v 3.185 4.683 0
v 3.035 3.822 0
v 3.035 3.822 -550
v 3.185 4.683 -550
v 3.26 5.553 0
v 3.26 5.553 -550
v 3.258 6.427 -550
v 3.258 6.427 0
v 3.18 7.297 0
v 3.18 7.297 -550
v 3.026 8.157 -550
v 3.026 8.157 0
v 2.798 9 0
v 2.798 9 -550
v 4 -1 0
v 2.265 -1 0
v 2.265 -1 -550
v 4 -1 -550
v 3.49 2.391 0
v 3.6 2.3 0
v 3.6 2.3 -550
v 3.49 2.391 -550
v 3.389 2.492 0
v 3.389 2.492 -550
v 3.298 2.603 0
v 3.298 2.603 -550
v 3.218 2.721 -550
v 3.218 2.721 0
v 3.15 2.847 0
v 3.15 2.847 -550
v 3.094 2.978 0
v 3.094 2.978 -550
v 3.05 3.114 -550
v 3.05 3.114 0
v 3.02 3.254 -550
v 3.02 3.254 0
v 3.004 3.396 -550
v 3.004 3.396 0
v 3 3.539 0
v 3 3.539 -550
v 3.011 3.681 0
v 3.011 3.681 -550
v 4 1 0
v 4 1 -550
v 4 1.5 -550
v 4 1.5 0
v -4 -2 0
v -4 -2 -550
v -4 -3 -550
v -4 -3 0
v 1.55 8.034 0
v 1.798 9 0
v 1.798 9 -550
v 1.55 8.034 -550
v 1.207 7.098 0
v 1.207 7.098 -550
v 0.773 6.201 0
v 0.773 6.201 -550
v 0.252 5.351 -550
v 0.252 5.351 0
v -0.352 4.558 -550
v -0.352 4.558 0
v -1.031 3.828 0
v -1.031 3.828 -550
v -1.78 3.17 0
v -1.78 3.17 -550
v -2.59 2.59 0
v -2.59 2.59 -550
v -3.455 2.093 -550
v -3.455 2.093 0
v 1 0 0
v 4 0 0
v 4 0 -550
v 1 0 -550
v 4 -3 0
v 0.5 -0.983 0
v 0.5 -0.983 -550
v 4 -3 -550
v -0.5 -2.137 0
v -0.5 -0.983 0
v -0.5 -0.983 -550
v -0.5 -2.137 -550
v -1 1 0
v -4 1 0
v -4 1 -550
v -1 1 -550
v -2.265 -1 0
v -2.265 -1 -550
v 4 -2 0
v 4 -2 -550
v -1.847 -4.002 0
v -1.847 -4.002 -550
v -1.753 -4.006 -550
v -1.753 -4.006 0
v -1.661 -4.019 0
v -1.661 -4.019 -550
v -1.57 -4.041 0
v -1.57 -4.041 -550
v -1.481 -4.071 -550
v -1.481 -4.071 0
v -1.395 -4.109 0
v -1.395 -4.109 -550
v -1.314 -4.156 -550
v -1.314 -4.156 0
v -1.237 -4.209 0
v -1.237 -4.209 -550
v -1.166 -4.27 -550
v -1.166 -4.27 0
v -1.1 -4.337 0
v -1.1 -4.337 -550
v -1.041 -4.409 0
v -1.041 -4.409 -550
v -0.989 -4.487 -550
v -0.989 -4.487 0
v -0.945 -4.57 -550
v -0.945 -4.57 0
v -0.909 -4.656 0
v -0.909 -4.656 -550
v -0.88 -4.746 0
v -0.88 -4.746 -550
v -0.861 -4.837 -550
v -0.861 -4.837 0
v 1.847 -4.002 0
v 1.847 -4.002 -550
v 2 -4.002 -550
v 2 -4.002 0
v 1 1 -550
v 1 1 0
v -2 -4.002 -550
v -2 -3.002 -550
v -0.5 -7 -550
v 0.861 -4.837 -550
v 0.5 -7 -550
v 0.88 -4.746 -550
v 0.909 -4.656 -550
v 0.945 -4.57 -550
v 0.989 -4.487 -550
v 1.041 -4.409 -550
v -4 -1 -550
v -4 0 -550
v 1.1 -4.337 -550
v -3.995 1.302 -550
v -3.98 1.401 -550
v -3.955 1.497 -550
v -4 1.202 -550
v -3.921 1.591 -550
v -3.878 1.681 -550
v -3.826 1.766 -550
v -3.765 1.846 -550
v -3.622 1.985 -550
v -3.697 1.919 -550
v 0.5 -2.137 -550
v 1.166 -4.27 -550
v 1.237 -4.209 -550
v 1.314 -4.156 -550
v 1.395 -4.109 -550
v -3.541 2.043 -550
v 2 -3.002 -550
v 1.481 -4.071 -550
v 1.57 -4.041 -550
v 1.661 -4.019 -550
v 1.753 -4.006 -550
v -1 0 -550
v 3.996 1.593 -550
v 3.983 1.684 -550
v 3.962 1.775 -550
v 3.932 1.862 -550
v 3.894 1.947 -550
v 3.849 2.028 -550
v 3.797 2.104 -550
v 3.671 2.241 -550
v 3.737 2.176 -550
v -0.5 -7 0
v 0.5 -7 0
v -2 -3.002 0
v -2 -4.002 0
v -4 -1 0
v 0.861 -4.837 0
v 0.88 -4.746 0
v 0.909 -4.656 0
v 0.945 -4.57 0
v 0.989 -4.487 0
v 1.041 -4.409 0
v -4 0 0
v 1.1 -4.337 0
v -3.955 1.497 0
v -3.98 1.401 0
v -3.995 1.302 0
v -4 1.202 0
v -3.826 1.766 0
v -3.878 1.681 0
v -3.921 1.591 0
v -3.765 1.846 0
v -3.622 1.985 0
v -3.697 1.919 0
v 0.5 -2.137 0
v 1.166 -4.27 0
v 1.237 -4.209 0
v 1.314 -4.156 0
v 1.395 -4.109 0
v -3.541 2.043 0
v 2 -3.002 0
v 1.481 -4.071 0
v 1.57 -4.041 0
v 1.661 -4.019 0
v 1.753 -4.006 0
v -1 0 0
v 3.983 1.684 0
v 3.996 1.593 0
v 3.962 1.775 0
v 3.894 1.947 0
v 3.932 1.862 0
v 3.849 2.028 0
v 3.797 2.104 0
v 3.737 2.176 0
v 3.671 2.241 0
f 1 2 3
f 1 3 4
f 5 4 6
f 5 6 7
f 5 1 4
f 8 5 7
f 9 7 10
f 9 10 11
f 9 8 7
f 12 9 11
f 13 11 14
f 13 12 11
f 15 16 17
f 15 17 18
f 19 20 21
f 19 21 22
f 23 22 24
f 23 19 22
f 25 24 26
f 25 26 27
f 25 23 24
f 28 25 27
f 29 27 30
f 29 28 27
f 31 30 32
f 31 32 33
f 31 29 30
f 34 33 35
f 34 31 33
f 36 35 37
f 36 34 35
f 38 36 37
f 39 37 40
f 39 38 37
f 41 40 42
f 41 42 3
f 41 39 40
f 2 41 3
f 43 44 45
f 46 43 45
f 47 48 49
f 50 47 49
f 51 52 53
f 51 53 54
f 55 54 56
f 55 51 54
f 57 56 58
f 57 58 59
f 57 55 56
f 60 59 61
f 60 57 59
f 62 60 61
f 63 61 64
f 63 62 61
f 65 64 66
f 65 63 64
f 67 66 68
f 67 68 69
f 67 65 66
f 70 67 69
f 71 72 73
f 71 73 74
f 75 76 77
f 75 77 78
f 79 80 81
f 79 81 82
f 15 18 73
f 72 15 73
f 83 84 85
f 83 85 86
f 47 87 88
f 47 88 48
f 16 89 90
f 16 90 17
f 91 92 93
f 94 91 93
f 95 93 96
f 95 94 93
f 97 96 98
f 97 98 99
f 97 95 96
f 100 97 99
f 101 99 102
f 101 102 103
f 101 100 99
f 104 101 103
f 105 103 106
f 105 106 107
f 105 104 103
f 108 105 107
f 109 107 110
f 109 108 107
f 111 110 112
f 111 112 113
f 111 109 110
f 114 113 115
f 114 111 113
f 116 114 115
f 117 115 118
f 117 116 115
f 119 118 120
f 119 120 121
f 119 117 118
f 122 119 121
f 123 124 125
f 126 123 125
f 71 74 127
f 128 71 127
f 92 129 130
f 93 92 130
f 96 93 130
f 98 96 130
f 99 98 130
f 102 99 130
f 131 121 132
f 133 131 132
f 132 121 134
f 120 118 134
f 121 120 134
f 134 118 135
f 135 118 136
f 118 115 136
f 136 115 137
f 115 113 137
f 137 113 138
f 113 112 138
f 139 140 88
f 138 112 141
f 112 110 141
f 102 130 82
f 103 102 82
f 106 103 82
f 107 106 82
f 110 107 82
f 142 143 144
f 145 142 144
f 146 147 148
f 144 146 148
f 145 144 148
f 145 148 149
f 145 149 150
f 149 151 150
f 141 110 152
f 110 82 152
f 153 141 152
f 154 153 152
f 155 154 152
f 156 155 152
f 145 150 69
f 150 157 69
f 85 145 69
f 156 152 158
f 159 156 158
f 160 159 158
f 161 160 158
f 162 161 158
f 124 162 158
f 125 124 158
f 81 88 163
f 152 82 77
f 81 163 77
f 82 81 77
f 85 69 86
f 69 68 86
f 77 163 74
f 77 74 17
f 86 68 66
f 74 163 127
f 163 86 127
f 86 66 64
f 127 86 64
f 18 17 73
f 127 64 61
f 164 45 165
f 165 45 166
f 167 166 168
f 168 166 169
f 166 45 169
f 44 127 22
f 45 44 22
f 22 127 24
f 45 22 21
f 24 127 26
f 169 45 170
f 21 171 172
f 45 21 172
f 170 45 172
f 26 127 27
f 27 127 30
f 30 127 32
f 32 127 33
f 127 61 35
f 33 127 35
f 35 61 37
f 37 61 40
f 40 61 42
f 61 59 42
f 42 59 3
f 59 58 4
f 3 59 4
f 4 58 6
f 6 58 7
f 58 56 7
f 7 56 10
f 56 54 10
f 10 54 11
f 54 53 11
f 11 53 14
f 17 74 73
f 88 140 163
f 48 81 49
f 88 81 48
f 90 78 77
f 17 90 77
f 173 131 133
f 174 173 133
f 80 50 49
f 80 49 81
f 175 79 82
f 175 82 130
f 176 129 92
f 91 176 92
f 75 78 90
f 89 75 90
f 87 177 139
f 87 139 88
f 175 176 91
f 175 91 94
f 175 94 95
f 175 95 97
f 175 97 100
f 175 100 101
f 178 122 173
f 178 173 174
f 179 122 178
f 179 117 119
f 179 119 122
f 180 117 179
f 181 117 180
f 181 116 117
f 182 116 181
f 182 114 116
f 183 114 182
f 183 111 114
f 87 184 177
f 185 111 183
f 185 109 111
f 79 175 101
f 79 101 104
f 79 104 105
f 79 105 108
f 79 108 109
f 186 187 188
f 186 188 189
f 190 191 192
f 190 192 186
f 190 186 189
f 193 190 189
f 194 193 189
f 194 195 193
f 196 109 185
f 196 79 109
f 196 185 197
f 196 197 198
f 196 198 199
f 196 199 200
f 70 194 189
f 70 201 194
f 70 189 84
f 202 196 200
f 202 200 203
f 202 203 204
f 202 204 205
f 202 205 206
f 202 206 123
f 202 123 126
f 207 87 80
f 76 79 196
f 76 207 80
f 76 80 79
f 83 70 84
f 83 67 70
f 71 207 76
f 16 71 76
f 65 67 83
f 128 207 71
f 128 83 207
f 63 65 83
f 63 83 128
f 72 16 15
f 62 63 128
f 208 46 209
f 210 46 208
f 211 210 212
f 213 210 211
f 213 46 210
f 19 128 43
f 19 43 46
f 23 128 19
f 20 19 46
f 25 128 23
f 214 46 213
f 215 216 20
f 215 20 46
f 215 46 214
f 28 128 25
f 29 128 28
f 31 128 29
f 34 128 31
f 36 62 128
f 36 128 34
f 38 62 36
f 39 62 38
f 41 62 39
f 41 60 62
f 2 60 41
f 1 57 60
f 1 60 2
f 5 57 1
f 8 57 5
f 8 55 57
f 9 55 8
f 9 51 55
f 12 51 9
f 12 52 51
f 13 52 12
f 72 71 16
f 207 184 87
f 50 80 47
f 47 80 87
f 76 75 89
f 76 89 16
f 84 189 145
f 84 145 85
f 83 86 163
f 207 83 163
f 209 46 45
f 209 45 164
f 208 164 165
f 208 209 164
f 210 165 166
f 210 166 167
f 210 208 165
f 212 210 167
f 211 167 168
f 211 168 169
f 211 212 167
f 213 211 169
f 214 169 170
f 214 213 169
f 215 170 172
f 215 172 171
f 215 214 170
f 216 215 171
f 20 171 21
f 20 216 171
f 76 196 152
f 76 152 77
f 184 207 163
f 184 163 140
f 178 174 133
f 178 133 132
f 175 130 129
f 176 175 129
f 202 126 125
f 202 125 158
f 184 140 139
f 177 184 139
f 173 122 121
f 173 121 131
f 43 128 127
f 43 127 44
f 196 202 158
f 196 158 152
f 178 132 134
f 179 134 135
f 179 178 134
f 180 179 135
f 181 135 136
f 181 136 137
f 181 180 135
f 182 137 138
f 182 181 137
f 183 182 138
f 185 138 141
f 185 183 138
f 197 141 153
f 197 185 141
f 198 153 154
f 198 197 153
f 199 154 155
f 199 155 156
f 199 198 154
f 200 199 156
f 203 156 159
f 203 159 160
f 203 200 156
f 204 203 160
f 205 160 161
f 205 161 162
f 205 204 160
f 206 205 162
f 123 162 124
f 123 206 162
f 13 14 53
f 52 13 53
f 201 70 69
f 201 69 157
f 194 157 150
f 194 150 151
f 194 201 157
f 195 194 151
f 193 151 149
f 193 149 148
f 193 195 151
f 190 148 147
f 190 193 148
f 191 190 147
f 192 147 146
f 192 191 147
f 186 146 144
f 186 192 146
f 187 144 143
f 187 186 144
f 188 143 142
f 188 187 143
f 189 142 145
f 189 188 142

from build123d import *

# Parameters (mm, degrees)
EXTRUSION1_DEPTH = 550


with BuildPart() as part:
    # Esquisse1 → Extrusion1 (new body)
    with BuildSketch(Plane.XY):
        with BuildLine():
            Line((4, 0), (1, 0))
            Line((1, 0), (1, 1))
            Line((1, 1), (4, 1))
            Line((4, 1), (4, 1.5))
            ThreePointArc((4, 1.5), (3.894427191, 1.947213595), (3.6, 2.3))
            ThreePointArc((3.6, 2.3), (3.093760184, 2.977994654), (3.034989317, 3.822092686))
            ThreePointArc((3.034989317, 3.822092686), (3.257790087, 6.426670848), (2.797958971, 9))
            Line((2.797958971, 9), (1.797958971, 9))
            ThreePointArc((1.797958971, 9), (-0.040046913, 4.946972092), (-3.454545455, 2.092764572))
            ThreePointArc((-3.454545455, 2.092764572), (-3.852802865, 1.724273997), (-4, 1.202041029))
            Line((-4, 1.202041029), (-4, 1))
            Line((-4, 1), (-1, 1))
            Line((-1, 1), (-1, 0))
            Line((-1, 0), (-4, 0))
            Line((-4, 0), (-4, -1))
            Line((-4, -1), (-2.264690261, -1))
            Line((-2.264690261, -1), (-4, -2))
            Line((-4, -2), (-4, -3))
            Line((-4, -3), (-0.5, -0.983069005))
            Line((-0.5, -0.983069005), (-0.5, -2.13722779))
            Line((-0.5, -2.13722779), (-2, -3.001626788))
            Line((-2, -3.001626788), (-2, -4.001626788))
            Line((-2, -4.001626788), (-1.847051532, -4.001626788))
            ThreePointArc((-1.847051532, -4.001626788), (-1.200710202, -4.238578372), (-0.860672076, -4.837141017))
            Line((-0.860672076, -4.837141017), (-0.5, -7))
            Line((-0.5, -7), (0.5, -7))
            Line((0.5, -7), (0.860672076, -4.837141017))
            ThreePointArc((0.860672076, -4.837141017), (1.200710202, -4.238578372), (1.847051532, -4.001626788))
            Line((1.847051532, -4.001626788), (2, -4.001626788))
            Line((2, -4.001626788), (2, -3.001626788))
            Line((2, -3.001626788), (0.5, -2.13722779))
            Line((0.5, -2.13722779), (0.5, -0.983069005))
            Line((0.5, -0.983069005), (4, -3))
            Line((4, -3), (4, -2))
            Line((4, -2), (2.264690261, -1))
            Line((2.264690261, -1), (4, -1))
            Line((4, -1), (4, 0))
        make_face()
    extrude(amount=-EXTRUSION1_DEPTH)


solid = part.part
